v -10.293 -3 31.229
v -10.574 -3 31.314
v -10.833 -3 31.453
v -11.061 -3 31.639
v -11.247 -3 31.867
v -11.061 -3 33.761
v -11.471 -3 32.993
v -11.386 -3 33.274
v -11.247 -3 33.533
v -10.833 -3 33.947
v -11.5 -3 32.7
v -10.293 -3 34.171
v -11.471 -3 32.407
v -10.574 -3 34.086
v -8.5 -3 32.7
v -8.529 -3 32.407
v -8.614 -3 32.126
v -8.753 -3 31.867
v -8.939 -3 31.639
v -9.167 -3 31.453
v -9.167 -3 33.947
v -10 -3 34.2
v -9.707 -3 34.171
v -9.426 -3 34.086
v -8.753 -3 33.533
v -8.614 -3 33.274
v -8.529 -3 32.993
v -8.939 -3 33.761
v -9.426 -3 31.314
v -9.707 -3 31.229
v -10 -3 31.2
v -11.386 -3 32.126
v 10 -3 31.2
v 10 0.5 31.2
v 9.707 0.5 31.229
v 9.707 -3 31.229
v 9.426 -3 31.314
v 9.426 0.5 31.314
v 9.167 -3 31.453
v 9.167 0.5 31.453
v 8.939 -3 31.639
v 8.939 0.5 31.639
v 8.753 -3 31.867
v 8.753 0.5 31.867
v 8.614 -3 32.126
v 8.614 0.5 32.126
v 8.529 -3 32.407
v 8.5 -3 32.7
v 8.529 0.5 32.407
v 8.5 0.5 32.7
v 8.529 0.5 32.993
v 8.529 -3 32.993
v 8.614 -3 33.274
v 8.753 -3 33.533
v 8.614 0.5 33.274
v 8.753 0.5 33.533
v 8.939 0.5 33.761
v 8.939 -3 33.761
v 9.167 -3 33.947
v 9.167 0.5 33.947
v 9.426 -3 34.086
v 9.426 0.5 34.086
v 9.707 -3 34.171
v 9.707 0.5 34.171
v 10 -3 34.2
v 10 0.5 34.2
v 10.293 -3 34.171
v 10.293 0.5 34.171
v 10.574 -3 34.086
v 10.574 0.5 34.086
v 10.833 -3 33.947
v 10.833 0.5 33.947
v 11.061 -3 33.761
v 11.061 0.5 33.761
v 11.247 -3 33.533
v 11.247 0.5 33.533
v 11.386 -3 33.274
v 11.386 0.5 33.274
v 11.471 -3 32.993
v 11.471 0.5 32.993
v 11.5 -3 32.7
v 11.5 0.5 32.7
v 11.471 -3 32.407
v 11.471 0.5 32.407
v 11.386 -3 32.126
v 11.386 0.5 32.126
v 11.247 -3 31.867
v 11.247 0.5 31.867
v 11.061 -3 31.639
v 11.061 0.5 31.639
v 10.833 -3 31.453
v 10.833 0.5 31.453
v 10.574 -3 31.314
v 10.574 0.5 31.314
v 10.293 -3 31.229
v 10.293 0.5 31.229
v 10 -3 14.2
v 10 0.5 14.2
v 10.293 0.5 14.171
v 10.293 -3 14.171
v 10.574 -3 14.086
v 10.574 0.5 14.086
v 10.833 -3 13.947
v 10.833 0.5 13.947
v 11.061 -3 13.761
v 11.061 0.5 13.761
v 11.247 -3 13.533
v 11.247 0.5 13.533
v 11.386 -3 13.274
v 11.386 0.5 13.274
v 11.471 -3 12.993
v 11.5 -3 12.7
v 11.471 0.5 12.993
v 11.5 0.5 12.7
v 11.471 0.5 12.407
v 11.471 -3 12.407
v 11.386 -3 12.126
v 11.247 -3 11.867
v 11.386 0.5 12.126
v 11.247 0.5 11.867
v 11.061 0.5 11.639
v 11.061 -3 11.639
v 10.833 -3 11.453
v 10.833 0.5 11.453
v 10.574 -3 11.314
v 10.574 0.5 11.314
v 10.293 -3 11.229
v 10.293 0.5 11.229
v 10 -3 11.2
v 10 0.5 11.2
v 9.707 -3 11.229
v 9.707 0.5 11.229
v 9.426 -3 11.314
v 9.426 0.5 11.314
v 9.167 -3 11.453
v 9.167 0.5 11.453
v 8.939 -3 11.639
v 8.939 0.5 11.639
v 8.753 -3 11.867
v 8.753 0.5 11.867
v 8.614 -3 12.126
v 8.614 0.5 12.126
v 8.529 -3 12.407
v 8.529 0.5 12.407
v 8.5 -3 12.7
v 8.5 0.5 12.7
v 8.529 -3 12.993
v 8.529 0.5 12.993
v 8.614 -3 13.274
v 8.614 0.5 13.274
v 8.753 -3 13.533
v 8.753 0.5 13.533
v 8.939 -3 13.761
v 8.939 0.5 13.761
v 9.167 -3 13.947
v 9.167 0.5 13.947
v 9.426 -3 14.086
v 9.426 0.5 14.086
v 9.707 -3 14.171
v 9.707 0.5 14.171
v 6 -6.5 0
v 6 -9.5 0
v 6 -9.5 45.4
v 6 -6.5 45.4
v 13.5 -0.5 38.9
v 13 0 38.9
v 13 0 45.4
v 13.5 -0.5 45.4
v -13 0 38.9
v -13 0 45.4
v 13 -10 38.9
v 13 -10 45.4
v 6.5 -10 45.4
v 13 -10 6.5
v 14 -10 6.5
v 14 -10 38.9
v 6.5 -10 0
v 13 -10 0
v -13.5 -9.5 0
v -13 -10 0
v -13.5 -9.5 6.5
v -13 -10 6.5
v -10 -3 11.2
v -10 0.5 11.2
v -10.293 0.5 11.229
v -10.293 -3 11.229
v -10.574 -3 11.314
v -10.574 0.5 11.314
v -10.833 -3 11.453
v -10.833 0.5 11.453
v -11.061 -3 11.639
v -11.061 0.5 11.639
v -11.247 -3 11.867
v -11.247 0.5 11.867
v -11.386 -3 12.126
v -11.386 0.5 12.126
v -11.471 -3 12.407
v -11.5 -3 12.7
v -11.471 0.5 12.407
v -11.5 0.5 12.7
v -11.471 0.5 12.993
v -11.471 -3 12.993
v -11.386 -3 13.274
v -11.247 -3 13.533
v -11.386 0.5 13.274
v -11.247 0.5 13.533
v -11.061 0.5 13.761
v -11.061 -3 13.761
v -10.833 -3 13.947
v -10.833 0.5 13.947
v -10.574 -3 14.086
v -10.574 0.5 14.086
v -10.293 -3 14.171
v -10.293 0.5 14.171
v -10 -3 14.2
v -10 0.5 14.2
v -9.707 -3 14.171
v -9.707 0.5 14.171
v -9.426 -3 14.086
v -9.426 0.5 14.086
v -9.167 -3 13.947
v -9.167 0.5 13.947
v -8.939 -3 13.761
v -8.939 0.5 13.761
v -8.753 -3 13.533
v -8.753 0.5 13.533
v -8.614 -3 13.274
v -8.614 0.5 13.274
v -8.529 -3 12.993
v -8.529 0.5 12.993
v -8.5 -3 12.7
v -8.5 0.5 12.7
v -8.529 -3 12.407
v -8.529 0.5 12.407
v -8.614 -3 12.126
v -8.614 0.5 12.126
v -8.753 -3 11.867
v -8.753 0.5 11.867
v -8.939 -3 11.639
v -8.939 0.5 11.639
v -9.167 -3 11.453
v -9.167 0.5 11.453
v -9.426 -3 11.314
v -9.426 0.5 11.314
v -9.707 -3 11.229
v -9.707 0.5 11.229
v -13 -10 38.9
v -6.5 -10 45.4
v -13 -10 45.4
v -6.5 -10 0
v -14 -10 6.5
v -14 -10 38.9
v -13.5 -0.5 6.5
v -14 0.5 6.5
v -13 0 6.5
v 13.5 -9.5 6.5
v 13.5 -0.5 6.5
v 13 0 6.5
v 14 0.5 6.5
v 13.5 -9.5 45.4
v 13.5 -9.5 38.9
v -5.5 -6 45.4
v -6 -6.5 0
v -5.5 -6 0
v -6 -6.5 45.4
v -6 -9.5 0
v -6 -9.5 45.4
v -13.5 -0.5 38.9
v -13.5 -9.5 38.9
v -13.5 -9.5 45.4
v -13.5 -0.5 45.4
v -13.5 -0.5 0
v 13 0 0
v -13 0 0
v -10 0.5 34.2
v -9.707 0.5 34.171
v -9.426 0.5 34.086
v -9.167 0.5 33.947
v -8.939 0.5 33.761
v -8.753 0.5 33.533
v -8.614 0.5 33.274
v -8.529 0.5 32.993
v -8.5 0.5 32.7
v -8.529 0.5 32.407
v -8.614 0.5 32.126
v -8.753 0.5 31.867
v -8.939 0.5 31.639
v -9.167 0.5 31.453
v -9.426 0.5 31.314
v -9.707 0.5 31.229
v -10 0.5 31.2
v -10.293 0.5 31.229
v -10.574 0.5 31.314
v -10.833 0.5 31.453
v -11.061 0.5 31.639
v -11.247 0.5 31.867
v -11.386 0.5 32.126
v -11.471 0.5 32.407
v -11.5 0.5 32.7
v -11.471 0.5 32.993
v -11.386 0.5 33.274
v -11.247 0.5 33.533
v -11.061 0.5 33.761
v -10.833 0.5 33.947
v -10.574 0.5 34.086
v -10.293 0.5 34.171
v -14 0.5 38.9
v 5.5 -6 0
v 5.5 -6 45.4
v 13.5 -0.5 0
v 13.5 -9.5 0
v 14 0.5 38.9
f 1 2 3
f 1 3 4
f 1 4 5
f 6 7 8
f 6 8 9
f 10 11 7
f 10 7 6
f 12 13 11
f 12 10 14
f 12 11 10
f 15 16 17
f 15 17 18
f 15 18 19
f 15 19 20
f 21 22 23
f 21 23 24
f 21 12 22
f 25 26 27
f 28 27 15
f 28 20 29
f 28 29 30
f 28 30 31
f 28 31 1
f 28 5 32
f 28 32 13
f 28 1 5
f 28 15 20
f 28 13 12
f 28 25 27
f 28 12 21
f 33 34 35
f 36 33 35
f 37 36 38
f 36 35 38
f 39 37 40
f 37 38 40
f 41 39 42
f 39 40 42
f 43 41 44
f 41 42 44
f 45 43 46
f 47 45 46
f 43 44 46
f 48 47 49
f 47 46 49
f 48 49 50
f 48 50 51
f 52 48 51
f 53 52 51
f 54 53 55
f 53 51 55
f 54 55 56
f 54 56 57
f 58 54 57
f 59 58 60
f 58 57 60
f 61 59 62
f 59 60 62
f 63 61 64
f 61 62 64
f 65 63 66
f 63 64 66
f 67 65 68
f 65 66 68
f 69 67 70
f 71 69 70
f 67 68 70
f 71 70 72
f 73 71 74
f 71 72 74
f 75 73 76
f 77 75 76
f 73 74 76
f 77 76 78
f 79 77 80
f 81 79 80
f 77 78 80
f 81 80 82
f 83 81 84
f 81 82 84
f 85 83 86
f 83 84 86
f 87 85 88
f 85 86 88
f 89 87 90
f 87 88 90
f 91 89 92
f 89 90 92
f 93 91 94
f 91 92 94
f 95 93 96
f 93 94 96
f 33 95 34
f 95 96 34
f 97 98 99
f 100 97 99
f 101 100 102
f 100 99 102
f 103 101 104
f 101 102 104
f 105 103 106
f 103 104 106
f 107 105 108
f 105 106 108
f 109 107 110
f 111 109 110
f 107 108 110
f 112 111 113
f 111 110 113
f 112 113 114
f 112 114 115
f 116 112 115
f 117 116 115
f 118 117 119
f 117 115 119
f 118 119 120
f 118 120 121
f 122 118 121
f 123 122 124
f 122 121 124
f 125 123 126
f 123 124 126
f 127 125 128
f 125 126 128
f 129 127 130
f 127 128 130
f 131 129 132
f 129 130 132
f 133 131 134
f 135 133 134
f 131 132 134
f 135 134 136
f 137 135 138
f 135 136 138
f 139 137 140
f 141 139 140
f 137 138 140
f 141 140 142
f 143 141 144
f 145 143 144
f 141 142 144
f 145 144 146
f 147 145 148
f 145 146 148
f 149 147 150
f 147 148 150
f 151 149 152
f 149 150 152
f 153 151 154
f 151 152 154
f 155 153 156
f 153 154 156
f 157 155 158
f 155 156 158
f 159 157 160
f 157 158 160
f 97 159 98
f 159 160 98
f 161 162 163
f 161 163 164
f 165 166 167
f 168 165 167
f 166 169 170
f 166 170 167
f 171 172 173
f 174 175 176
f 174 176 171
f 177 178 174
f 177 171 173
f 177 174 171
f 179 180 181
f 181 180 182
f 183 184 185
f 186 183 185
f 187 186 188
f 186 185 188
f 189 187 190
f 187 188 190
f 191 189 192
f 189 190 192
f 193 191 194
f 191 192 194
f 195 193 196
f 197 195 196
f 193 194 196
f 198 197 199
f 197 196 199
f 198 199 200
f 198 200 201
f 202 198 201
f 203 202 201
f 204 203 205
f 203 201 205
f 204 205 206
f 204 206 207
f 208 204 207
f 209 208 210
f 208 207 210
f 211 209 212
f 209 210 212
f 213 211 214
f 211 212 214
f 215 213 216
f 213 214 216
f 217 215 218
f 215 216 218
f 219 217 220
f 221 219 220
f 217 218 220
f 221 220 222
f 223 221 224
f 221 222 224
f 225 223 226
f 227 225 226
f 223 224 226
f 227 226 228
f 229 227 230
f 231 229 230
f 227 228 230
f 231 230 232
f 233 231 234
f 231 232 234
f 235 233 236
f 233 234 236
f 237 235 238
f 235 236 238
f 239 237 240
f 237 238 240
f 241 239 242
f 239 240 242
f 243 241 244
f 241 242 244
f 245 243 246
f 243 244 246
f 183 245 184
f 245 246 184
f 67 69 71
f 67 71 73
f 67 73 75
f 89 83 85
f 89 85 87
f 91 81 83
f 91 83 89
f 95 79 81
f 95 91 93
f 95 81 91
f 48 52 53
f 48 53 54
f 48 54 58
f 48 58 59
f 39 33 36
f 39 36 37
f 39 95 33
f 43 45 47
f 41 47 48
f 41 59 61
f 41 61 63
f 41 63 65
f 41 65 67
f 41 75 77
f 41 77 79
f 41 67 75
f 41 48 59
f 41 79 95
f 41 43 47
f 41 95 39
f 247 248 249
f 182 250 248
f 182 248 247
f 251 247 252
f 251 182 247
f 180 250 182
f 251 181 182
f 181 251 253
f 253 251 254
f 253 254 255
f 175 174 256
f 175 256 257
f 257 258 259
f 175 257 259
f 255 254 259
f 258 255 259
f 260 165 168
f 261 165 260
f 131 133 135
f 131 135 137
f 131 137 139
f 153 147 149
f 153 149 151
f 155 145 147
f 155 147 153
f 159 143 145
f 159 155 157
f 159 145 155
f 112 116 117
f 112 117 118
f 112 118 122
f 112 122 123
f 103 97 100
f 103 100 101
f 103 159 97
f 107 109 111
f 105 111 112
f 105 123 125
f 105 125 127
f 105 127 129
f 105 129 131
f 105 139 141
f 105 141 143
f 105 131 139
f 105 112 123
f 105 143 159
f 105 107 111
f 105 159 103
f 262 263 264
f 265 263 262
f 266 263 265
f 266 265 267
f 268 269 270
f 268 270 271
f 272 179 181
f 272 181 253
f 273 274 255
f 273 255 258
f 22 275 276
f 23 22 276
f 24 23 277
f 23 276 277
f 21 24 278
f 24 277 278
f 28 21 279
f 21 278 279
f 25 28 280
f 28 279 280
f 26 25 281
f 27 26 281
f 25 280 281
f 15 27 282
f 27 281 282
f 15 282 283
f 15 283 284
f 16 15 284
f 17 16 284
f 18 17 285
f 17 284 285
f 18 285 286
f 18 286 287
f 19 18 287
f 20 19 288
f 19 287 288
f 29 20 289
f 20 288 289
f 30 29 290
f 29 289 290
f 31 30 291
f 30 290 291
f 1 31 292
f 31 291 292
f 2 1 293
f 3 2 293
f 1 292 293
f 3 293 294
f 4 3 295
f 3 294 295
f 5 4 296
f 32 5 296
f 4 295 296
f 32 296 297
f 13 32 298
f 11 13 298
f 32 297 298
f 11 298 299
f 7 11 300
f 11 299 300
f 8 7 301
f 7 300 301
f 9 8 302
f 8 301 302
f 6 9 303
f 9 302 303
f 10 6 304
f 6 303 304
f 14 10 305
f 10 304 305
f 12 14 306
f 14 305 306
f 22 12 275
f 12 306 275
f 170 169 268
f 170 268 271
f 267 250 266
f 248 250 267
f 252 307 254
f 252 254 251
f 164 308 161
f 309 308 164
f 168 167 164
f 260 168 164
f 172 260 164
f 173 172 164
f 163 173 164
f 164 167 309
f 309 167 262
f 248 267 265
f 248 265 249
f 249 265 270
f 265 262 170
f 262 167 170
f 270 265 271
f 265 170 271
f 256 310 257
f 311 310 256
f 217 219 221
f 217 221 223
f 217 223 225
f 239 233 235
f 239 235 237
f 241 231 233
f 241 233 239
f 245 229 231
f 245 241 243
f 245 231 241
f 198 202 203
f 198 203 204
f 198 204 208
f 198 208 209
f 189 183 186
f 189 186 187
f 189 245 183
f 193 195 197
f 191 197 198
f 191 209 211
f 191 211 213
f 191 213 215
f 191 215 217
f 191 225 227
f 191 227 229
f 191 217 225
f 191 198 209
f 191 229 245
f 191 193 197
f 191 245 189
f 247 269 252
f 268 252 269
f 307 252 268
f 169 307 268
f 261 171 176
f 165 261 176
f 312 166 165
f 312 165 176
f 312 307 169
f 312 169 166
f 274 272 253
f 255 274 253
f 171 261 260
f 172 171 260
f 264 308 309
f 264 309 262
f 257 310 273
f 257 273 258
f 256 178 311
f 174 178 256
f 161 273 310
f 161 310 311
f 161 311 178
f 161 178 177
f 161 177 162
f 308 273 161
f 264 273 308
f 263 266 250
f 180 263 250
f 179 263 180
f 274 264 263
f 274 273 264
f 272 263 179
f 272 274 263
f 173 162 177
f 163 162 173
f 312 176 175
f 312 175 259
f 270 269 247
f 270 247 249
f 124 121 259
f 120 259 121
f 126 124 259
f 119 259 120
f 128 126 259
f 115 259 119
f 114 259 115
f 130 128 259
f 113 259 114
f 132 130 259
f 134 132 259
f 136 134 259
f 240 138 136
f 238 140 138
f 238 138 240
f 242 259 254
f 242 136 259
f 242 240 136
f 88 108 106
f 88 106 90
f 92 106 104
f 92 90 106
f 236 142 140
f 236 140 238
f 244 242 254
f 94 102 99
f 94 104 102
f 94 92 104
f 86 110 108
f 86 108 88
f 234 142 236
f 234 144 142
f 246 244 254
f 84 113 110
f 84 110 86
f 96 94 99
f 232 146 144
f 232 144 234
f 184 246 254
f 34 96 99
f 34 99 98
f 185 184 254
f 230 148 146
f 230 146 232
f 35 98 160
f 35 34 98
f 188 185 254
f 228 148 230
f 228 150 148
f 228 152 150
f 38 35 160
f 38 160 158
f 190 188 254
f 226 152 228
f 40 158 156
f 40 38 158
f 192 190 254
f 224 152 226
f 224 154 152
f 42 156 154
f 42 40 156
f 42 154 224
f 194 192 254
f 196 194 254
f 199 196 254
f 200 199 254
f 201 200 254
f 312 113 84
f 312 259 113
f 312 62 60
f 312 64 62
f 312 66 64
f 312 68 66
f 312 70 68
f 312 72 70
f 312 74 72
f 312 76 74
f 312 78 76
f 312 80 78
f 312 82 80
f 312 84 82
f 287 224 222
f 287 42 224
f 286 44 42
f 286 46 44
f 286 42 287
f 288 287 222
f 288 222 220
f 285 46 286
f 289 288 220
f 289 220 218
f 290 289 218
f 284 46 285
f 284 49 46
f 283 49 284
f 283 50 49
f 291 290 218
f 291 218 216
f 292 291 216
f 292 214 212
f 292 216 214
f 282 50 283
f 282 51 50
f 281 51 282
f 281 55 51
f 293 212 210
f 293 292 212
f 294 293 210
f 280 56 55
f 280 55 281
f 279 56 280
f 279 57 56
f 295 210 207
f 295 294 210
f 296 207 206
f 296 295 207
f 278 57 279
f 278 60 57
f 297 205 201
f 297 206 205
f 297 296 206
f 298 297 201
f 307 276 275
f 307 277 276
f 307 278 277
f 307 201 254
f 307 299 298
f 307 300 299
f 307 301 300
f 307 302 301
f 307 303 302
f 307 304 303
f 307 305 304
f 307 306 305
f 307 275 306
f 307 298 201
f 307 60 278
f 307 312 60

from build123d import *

# Parameters (mm, degrees)
EXTRUDE_1_DEPTH     = 45.4
EXTRUDE_START       = -6.5
EXTRUDE_2_DEPTH     = 32.4
CHAMFER_1_SIZE      = 0.5
SKETCH_3_R          = 1.5
CUT_EXTRUDE_1_DEPTH = 3.5


with BuildPart() as part:
    # 草图1 → 凸台-拉伸1 (new body)
    with BuildSketch(Plane.XY):
        Polygon((-13.5, 0), (13.5, 0), (13.5, -10), (6, -10), (6, -6), (-6, -6), (-6, -10), (-13.5, -10), align=None)
    extrude(amount=EXTRUDE_1_DEPTH)

    # 草图2 → 凸台-拉伸2 (add)
    with BuildSketch(Plane.XY.offset(45.4).offset(EXTRUDE_START)):
        Polygon((14, -10), (14, 0.5), (-14, 0.5), (-14, -10), (-13.5, -10), (-13.5, 0), (13.5, 0), (13.5, -10), align=None)
    extrude(amount=-EXTRUDE_2_DEPTH)

    # 倒角1
    chamfer_1_edges = [part.edges().sort_by_distance(p)[0] for p in [
        (13.5, -10, 42.15),
        (6, -10, 22.7),
        (6, -6, 22.7),
        (-6, -6, 22.7),
        (-6, -10, 22.7),
        (-13.5, -10, 42.15),
        (-13.5, 0, 42.15),
        (13.5, 0, 42.15),
        (13.5, -10, 3.25),
        (-13.5, -10, 3.25),
        (-13.5, 0, 3.25),
        (13.5, 0, 3.25),
    ]]
    chamfer(chamfer_1_edges, length=CHAMFER_1_SIZE)

    # 草图3 → 切除-拉伸1 (cut)
    with BuildSketch(Plane(origin=(0, 0.5, 0), x_dir=(1, 0, 0), z_dir=(0, 1, 0))):
        with Locations(Location((10, -12.7, 0), (0, 0, 270))):
            Circle(SKETCH_3_R)
        with Locations(Location((10, -32.7, 0), (0, 0, 90))):
            Circle(SKETCH_3_R)
        with Locations(Location((-10, -32.7, 0), (0, 0, 270))):
            Circle(SKETCH_3_R)
        with Locations(Location((-10, -12.7, 0), (0, 0, 90))):
            Circle(SKETCH_3_R)
    extrude(amount=-CUT_EXTRUDE_1_DEPTH, mode=Mode.SUBTRACT)


solid = part.part
